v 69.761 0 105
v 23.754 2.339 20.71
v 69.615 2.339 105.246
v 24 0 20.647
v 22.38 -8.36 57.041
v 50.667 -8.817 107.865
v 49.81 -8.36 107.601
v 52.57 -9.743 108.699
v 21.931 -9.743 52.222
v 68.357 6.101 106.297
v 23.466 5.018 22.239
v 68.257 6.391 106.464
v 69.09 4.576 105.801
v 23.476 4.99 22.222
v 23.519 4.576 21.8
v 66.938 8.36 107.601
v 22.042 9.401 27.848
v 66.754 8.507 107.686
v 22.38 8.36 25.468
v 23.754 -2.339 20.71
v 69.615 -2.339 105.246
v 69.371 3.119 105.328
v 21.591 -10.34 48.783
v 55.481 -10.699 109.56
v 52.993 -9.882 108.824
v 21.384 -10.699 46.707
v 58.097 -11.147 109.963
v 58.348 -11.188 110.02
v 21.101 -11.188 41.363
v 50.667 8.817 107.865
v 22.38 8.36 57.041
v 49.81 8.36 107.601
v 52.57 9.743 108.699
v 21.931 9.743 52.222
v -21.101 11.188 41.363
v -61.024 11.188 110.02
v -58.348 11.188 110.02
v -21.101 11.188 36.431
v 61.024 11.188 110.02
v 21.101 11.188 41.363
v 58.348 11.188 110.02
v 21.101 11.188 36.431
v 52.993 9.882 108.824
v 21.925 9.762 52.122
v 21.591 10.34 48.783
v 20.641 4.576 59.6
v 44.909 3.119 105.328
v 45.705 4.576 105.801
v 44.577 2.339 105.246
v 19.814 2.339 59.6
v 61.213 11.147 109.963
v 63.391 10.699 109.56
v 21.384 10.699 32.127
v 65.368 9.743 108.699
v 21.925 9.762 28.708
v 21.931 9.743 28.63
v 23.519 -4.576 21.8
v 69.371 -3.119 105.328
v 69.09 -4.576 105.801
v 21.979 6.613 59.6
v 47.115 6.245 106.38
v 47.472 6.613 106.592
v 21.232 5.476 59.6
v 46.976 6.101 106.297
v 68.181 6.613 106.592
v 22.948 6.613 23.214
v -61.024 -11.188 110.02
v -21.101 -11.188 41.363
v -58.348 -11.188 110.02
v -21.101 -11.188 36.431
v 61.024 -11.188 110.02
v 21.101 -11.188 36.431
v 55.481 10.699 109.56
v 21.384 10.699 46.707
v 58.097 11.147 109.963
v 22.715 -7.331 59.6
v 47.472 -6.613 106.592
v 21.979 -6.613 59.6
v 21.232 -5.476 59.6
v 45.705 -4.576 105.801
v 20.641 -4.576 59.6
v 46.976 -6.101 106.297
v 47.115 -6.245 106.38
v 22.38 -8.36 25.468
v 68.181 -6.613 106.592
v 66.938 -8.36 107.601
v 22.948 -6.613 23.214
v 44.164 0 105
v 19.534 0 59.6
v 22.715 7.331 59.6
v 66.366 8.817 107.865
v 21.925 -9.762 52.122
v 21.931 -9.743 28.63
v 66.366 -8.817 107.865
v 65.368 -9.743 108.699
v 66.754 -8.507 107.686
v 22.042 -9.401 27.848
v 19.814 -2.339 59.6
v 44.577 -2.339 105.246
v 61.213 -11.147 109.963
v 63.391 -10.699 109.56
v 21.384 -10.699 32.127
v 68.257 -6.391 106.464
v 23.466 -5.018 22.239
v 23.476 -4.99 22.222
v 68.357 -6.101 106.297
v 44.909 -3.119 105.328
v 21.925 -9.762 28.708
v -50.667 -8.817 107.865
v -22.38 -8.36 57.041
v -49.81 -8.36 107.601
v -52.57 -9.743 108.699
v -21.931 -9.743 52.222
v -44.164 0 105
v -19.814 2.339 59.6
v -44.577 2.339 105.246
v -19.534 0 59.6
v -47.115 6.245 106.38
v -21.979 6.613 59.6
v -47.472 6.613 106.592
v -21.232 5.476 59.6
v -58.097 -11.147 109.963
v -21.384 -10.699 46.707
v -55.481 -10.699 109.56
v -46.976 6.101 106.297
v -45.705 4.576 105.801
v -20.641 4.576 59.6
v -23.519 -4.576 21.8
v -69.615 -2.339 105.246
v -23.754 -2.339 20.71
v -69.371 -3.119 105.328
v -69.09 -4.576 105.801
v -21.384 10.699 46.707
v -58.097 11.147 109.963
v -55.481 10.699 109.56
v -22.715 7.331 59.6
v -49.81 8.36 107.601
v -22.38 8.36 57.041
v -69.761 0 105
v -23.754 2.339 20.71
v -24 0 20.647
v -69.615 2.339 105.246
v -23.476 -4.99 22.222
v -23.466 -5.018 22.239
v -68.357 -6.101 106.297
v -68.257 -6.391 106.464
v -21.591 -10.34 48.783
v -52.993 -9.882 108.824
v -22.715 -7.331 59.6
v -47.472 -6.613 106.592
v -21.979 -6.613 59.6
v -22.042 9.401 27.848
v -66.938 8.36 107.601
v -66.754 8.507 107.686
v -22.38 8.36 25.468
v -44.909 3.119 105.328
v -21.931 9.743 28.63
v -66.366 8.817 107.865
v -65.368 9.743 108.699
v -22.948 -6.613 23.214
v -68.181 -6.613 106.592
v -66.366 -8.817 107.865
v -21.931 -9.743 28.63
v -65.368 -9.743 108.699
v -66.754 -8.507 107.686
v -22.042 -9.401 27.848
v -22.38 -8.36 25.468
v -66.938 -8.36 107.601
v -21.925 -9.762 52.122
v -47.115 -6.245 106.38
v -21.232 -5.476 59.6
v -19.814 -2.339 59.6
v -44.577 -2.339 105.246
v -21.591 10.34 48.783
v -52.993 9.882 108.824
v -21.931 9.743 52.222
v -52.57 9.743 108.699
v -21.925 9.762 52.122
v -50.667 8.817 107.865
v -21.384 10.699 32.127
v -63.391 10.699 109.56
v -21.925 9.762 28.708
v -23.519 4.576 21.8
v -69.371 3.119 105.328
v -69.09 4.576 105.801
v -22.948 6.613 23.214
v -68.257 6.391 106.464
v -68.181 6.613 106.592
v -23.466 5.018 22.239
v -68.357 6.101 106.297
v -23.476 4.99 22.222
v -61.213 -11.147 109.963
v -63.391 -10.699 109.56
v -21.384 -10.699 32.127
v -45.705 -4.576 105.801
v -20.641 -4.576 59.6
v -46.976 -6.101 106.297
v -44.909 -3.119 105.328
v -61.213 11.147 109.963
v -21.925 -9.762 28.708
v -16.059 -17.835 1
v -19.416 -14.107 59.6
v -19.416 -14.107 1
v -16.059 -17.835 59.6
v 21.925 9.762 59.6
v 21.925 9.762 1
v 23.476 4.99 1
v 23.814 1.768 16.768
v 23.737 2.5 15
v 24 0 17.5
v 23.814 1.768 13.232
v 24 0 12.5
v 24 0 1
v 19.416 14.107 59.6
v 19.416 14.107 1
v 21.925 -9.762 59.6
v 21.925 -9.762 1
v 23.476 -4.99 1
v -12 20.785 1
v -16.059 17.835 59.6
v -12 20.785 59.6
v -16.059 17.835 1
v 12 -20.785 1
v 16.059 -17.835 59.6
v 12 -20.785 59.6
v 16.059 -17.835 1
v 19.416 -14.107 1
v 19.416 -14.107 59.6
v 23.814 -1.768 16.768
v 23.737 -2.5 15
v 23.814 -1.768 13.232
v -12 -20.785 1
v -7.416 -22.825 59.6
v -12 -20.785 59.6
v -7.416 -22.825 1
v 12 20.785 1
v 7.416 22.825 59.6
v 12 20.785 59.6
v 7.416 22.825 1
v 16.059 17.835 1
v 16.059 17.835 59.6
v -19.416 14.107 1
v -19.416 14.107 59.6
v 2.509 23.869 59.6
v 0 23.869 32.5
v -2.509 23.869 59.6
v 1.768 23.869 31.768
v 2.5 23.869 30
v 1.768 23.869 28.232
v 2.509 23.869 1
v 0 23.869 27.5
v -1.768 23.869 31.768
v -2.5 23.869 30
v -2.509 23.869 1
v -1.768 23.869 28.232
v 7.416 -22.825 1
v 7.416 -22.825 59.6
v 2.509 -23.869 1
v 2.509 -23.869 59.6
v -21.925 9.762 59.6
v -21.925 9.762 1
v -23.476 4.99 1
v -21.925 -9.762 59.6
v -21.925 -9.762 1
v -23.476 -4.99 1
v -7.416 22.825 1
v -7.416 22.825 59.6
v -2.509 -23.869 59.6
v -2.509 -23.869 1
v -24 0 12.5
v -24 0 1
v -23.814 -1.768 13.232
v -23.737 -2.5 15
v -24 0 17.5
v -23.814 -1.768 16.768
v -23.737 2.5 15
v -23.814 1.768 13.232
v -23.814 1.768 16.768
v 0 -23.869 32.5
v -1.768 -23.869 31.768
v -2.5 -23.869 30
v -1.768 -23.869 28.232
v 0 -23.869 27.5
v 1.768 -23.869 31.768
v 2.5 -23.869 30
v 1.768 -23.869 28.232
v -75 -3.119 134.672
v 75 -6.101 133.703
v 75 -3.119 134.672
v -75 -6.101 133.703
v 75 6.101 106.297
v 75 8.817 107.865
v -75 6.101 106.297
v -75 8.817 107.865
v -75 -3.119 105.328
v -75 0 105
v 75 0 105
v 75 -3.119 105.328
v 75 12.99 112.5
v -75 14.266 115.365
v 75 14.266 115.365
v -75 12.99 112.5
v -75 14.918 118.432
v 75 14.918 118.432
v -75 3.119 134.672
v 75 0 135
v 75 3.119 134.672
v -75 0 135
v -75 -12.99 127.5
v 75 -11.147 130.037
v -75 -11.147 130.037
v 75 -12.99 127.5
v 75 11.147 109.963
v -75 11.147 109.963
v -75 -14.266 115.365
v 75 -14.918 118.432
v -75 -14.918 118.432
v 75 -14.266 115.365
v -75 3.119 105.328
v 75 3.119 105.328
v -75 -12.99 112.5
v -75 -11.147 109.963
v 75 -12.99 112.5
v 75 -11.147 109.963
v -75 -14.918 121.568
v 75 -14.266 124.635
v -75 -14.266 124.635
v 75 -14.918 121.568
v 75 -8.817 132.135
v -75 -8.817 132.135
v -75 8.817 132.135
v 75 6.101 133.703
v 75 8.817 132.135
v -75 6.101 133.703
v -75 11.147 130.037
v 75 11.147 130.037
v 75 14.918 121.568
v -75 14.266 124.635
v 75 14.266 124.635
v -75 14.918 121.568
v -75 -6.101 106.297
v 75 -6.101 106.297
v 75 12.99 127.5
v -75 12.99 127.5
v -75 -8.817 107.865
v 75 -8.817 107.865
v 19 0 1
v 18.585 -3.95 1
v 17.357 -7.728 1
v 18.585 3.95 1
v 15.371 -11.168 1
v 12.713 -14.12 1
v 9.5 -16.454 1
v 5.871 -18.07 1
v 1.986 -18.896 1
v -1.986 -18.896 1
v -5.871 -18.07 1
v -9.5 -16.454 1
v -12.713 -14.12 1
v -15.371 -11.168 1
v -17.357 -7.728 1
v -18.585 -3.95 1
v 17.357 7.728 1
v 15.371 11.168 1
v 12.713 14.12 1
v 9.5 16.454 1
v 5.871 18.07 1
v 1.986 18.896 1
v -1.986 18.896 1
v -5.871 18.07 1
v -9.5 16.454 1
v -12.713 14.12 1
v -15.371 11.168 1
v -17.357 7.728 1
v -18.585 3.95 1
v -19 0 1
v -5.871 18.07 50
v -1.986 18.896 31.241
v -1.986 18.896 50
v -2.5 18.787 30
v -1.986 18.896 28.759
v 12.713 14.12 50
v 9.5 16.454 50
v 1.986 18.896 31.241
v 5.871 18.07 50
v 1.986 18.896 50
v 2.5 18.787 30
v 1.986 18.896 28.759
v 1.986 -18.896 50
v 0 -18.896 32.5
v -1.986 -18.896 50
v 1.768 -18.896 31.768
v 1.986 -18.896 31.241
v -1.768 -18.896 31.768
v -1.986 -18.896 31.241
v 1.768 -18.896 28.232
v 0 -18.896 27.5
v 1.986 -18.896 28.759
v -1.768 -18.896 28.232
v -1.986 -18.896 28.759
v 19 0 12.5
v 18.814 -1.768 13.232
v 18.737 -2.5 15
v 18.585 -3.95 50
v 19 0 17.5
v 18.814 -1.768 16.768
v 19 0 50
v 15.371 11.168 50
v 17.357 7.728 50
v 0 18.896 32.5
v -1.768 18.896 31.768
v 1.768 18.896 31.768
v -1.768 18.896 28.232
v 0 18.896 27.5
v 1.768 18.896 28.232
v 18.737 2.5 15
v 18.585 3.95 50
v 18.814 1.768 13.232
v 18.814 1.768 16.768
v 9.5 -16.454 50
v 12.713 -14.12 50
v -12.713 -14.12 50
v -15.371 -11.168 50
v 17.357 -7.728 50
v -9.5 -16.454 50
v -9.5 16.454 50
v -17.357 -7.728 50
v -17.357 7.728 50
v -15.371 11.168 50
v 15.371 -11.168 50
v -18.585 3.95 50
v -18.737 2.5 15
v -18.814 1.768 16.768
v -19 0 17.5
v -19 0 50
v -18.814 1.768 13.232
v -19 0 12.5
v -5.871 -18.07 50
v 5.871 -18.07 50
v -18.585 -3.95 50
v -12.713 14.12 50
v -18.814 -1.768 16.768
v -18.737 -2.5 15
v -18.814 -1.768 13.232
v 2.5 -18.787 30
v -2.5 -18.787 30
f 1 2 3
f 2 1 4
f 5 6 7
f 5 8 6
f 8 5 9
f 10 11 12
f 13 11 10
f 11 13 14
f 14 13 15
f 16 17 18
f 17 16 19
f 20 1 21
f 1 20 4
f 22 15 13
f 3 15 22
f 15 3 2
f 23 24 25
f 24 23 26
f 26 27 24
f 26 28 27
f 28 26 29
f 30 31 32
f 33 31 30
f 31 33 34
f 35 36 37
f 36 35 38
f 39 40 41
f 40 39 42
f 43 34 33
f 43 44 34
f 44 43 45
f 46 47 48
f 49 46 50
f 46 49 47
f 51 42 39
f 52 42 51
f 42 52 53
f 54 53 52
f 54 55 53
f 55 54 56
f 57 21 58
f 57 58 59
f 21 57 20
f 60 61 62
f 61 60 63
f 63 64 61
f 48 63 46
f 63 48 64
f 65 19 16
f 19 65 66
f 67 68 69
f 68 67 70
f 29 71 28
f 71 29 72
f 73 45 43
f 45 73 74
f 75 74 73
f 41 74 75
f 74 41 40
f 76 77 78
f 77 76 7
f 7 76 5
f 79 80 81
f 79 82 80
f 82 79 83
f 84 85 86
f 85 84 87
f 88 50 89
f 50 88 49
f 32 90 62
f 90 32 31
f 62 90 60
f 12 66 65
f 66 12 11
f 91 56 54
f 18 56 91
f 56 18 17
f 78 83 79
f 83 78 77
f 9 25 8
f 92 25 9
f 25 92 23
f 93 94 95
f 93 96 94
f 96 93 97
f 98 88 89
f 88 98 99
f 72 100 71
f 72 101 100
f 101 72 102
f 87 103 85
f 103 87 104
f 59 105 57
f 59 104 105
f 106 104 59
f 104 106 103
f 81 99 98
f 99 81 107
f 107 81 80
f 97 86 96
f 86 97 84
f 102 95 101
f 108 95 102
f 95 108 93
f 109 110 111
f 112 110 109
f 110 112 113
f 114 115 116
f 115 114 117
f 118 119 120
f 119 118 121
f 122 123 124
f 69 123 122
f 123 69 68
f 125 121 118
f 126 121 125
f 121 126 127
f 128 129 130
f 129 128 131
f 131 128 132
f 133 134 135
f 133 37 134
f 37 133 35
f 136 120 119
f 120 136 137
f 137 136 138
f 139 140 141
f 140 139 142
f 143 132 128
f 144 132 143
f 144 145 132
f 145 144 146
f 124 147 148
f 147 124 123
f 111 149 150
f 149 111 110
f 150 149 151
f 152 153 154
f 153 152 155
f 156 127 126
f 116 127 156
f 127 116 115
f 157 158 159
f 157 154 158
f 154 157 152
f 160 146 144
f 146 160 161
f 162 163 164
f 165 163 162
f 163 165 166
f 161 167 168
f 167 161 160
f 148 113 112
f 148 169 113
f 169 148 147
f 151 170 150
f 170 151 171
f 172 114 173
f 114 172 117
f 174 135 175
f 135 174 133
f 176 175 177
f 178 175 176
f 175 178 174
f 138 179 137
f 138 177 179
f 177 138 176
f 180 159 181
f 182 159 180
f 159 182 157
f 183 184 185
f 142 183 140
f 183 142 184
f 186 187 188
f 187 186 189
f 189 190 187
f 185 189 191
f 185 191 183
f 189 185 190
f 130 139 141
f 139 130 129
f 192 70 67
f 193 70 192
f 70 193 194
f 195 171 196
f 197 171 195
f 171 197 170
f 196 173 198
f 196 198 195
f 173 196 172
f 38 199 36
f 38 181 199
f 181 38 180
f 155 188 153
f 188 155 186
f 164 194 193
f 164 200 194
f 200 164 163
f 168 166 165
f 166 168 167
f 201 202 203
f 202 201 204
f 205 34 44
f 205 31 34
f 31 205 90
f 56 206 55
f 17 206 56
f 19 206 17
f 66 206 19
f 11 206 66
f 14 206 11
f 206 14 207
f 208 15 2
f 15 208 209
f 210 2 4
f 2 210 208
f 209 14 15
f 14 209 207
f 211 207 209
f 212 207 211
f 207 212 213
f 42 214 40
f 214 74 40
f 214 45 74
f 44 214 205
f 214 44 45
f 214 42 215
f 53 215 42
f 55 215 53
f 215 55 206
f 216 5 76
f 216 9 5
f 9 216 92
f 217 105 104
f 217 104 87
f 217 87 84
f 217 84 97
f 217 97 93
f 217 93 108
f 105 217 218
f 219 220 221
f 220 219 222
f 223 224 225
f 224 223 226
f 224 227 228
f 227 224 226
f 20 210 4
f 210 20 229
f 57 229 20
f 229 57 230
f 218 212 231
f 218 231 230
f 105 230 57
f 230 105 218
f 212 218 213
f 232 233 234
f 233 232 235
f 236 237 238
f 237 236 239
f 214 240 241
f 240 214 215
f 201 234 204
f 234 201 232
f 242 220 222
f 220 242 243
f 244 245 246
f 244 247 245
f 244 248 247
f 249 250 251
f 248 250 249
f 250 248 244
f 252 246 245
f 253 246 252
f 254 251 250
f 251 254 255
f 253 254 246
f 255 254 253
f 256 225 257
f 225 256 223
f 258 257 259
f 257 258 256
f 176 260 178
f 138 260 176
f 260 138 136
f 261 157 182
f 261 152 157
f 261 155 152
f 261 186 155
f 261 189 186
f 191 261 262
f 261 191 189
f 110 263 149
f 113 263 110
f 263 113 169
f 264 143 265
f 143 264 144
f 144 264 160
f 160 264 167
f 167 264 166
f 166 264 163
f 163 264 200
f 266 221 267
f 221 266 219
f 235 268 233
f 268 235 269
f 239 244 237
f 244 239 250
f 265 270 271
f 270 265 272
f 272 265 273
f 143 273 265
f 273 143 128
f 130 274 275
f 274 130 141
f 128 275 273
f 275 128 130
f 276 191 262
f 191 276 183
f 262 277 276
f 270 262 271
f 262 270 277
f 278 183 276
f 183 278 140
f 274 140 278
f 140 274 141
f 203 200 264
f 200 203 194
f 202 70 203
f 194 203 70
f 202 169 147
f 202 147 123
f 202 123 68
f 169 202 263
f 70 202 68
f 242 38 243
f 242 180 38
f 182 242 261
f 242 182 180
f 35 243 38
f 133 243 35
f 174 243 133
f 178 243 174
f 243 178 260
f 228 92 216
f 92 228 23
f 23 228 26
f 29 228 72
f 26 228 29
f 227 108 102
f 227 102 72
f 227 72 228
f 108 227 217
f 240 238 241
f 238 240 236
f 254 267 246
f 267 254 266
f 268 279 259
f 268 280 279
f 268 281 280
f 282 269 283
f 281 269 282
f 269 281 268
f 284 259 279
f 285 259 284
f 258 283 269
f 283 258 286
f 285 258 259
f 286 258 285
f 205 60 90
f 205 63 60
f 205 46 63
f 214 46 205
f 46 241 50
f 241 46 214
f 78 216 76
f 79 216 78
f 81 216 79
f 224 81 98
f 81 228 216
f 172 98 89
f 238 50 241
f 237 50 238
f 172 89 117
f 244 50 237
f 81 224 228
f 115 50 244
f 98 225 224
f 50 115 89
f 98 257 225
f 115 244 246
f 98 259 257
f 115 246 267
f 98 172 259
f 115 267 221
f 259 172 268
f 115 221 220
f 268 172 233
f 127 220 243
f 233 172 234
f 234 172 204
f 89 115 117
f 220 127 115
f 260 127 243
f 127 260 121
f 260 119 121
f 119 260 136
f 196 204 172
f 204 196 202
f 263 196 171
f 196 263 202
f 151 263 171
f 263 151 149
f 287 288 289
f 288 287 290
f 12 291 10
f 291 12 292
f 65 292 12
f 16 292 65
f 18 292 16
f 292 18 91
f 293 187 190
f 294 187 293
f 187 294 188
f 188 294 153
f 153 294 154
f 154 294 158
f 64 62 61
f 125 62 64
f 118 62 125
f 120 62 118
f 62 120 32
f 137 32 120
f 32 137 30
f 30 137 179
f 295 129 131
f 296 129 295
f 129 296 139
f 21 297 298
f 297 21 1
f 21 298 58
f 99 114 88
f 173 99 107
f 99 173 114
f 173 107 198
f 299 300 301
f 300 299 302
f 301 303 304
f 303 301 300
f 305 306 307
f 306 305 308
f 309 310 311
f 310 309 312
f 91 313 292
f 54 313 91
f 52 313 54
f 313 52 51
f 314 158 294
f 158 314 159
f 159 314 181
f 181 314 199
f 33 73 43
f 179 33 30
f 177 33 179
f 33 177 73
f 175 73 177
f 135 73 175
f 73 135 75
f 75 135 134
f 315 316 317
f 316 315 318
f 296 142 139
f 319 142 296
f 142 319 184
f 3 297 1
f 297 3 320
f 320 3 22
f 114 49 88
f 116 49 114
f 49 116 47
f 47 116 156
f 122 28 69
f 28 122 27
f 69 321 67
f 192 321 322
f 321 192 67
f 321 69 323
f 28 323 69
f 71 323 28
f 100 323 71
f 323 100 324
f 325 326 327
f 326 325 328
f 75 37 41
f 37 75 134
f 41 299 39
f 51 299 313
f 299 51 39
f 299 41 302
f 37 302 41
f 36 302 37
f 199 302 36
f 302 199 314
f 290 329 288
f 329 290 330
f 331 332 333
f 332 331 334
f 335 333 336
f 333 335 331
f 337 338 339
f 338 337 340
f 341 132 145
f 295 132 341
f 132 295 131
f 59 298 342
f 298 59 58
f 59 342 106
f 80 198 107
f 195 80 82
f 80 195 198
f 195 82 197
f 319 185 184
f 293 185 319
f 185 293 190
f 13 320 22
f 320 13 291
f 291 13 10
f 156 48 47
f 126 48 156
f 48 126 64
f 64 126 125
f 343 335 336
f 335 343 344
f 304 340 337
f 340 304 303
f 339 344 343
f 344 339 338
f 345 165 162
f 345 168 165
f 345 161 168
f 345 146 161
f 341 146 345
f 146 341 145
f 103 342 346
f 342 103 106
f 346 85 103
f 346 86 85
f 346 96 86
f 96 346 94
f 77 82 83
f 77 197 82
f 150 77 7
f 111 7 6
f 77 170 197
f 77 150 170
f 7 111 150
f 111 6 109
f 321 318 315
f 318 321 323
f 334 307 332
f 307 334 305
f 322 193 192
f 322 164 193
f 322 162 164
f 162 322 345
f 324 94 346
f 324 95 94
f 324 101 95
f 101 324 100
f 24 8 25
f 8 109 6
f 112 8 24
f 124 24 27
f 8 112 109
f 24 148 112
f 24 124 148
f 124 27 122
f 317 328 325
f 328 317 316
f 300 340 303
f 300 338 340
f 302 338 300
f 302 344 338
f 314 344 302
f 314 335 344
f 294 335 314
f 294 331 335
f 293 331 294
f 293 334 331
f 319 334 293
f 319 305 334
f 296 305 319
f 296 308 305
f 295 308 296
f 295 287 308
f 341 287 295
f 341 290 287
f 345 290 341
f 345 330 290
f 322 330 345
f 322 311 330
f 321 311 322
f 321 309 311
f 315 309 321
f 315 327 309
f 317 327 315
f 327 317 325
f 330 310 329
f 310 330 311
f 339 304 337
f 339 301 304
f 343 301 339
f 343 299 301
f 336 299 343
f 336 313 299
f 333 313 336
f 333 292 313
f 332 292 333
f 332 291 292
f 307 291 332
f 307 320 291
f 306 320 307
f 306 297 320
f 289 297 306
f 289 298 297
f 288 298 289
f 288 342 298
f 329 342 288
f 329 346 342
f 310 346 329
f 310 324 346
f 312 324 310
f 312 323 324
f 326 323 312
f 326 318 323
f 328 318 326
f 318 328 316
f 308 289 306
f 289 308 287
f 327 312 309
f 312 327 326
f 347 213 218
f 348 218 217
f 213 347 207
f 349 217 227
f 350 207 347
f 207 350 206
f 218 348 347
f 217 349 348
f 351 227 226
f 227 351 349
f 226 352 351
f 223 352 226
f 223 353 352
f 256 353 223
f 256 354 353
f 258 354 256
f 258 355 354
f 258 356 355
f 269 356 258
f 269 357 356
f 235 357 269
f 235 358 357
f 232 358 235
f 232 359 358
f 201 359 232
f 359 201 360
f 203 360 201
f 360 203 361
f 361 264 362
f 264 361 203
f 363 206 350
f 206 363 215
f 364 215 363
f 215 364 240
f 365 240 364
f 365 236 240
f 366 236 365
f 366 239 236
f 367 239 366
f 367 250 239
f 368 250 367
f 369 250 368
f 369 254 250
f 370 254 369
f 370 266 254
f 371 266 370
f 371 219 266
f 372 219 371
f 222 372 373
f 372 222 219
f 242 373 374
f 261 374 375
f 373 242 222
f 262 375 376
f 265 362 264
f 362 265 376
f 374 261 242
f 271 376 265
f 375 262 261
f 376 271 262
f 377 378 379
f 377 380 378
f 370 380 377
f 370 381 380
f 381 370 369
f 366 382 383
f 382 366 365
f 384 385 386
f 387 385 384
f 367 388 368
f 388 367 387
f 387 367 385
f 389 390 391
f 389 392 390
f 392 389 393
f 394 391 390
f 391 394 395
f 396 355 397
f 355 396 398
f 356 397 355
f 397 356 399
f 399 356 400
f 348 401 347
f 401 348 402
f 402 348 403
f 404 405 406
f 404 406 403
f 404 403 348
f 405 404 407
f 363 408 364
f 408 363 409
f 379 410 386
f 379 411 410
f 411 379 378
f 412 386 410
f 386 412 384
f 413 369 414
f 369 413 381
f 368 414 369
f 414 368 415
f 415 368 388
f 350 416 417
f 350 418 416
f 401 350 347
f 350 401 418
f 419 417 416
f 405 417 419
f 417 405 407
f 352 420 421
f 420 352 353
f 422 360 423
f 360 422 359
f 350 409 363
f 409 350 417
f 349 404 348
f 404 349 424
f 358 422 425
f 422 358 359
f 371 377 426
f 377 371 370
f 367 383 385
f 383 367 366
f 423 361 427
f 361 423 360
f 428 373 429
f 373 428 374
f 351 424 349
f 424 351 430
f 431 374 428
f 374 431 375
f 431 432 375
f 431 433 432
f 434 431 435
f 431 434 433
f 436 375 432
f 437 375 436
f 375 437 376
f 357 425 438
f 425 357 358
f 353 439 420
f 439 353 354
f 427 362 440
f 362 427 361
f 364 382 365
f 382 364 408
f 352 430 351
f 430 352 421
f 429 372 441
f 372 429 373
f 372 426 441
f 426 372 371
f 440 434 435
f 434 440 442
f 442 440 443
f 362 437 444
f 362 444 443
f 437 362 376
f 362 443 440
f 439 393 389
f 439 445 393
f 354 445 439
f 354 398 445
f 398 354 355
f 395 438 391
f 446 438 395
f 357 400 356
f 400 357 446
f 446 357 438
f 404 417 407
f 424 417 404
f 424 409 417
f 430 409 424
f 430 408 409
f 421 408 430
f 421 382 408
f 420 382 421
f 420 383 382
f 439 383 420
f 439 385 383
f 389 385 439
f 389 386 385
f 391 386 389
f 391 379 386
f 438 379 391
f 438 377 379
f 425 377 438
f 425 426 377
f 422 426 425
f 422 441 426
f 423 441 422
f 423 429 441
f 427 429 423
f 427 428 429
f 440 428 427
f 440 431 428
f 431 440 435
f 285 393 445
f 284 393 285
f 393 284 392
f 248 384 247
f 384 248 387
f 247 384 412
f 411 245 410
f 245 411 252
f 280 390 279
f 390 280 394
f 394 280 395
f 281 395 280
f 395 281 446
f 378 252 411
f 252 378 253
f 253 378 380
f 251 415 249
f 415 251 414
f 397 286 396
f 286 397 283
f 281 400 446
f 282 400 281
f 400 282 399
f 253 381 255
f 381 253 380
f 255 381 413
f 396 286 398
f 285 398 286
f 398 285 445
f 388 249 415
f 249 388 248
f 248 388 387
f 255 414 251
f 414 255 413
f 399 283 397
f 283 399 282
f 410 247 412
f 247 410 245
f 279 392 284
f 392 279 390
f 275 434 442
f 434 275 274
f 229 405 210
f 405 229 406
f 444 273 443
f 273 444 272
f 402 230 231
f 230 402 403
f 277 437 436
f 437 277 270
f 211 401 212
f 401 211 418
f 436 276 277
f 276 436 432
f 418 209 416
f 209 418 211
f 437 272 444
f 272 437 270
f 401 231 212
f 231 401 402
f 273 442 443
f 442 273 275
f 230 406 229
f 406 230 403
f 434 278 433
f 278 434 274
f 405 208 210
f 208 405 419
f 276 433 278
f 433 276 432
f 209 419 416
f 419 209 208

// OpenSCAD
/*[Overall Dimesnions]*/

//length of overlap on handle
O_Length = 50;

//Inner Diameter of overlap
In_Dia = 38;

//Outer diamter of overlap
Out_Dia = 48;

//length from start of overlap to center of grip
S_Length =  120;

//diameter of Grip
G_Dia = 30;

//length of grip
G_Length = 150;

//distance to trim (leave here at 40, unless model comes out with excess from the rods)
trim = 40;

/*[mounting holes]*/

// You can have up to 3 holes, for more add to the source code
// Holes will be completly through from one side to the other of the overlap

//Hole 1 diameter
H1_Dia = 5;

// Hole 1 X location
H1_X = 0;

//Hole 1 Y location
H1_Y= 0;

//Hole 1 Z loaction
H1_Z = 30;

//Hole 1 X Rotation 
H1_Xrot = 90;

//Hole 1 Y Rotaion
H1_Yrot = 0;

//Hole 1 Z Rotation
H1_Zrot = 0;

//Hole 2 diameter ((leave at 0 to not have))
H2_Dia = 5;

// Hole 2 X location
H2_X = 0;

//Hole 2 Y location
H2_Y= 0;

//Hole 2 Z loaction
H2_Z = 15;

//Hole 2 X Rotation
H2_Xrot = 0;

//Hole 2 Y Rotaion
H2_Yrot = 90;

//Hole 2 Z Rotation
H2_Zrot = 0;

//Hole 3 diameter ((leave at 0 to not have))
H3_Dia = 0;

// Hole 3 X location
H3_X = 0;

//Hole 3 Y location
H3_Y= 0;

//Hole 3 Z loaction
H3_Z = 0;

//Hole 3 X Rotation 
H3_Xrot = 0;

//Hole 3 Y Rotaion
H3_Yrot = 0;

//Hole 3 Z Rotation
H3_Zrot = 0;
/*[Hidden]*/

//math
hyp = sqrt( pow(S_Length, 2) + pow( .5 * G_Length,2));

//angle
angle = atan( ((.5 * G_Length)-(.33*G_Dia))/S_Length);


//overlap section
module overlap () {
difference (){
cylinder(h = O_Length, d = Out_Dia, center=false);
}
}

//handle to grip
module grip () {
rotate([0,90,0]) translate([-S_Length,0,0])cylinder(h = G_Length, d = G_Dia, center=true);
}

//now, try to make the important part the connetor beams
module bars (){
union(){
rotate([0,angle,0])cylinder(h = hyp, d = .75*G_Dia, center = false);
rotate([0,-angle,0])cylinder(h = hyp, d = .75*G_Dia, center = false);
}
}

//cap to cover top of wooden shovel handle
module cap (){
translate([0,0,O_Length])cylinder(h=.2*Out_Dia, d = Out_Dia, center=false);
}

//mounting holes
module hole_1 (){
translate([H1_X,H1_Y,H1_Z])rotate([H1_Xrot,H1_Yrot,H1_Zrot])cylinder(h=Out_Dia*2, d=H1_Dia, center=true);
}

module hole_2 (){
translate([H2_X,H2_Y,H2_Z])rotate([H2_Xrot,H2_Yrot,H2_Zrot])cylinder(h=Out_Dia*2, d=H2_Dia, center=true);
}

module hole_3 (){
translate([H3_X,H3_Y,H3_Z])rotate([H3_Xrot,H3_Yrot,H3_Zrot])cylinder(h=Out_Dia*2, d=H3_Dia, center=true);
}


//joing solid parts together
module handle_together (){
union () {
overlap();
cap();
bars();
grip();

}
}

//pulling hollow, trimming parts out
module trimmed () {
difference (){
handle_together();
rotate([0,180,0])translate([0,0,-1])cylinder(h= trim, d = Out_Dia + 20, center=false);
rotate([0,90,0])translate([-S_Length, 0, .5*G_Length])cylinder(h= trim, d = G_Dia + 20, center=false);
rotate([0,90,0])translate([-S_Length, 0, -.5*G_Length-trim])cylinder(h= trim, d = G_Dia + 20, center=false);
cylinder(h = O_Length, d = In_Dia, center=false);
hole_1();
hole_2();
hole_3();
}
}
trimmed();
